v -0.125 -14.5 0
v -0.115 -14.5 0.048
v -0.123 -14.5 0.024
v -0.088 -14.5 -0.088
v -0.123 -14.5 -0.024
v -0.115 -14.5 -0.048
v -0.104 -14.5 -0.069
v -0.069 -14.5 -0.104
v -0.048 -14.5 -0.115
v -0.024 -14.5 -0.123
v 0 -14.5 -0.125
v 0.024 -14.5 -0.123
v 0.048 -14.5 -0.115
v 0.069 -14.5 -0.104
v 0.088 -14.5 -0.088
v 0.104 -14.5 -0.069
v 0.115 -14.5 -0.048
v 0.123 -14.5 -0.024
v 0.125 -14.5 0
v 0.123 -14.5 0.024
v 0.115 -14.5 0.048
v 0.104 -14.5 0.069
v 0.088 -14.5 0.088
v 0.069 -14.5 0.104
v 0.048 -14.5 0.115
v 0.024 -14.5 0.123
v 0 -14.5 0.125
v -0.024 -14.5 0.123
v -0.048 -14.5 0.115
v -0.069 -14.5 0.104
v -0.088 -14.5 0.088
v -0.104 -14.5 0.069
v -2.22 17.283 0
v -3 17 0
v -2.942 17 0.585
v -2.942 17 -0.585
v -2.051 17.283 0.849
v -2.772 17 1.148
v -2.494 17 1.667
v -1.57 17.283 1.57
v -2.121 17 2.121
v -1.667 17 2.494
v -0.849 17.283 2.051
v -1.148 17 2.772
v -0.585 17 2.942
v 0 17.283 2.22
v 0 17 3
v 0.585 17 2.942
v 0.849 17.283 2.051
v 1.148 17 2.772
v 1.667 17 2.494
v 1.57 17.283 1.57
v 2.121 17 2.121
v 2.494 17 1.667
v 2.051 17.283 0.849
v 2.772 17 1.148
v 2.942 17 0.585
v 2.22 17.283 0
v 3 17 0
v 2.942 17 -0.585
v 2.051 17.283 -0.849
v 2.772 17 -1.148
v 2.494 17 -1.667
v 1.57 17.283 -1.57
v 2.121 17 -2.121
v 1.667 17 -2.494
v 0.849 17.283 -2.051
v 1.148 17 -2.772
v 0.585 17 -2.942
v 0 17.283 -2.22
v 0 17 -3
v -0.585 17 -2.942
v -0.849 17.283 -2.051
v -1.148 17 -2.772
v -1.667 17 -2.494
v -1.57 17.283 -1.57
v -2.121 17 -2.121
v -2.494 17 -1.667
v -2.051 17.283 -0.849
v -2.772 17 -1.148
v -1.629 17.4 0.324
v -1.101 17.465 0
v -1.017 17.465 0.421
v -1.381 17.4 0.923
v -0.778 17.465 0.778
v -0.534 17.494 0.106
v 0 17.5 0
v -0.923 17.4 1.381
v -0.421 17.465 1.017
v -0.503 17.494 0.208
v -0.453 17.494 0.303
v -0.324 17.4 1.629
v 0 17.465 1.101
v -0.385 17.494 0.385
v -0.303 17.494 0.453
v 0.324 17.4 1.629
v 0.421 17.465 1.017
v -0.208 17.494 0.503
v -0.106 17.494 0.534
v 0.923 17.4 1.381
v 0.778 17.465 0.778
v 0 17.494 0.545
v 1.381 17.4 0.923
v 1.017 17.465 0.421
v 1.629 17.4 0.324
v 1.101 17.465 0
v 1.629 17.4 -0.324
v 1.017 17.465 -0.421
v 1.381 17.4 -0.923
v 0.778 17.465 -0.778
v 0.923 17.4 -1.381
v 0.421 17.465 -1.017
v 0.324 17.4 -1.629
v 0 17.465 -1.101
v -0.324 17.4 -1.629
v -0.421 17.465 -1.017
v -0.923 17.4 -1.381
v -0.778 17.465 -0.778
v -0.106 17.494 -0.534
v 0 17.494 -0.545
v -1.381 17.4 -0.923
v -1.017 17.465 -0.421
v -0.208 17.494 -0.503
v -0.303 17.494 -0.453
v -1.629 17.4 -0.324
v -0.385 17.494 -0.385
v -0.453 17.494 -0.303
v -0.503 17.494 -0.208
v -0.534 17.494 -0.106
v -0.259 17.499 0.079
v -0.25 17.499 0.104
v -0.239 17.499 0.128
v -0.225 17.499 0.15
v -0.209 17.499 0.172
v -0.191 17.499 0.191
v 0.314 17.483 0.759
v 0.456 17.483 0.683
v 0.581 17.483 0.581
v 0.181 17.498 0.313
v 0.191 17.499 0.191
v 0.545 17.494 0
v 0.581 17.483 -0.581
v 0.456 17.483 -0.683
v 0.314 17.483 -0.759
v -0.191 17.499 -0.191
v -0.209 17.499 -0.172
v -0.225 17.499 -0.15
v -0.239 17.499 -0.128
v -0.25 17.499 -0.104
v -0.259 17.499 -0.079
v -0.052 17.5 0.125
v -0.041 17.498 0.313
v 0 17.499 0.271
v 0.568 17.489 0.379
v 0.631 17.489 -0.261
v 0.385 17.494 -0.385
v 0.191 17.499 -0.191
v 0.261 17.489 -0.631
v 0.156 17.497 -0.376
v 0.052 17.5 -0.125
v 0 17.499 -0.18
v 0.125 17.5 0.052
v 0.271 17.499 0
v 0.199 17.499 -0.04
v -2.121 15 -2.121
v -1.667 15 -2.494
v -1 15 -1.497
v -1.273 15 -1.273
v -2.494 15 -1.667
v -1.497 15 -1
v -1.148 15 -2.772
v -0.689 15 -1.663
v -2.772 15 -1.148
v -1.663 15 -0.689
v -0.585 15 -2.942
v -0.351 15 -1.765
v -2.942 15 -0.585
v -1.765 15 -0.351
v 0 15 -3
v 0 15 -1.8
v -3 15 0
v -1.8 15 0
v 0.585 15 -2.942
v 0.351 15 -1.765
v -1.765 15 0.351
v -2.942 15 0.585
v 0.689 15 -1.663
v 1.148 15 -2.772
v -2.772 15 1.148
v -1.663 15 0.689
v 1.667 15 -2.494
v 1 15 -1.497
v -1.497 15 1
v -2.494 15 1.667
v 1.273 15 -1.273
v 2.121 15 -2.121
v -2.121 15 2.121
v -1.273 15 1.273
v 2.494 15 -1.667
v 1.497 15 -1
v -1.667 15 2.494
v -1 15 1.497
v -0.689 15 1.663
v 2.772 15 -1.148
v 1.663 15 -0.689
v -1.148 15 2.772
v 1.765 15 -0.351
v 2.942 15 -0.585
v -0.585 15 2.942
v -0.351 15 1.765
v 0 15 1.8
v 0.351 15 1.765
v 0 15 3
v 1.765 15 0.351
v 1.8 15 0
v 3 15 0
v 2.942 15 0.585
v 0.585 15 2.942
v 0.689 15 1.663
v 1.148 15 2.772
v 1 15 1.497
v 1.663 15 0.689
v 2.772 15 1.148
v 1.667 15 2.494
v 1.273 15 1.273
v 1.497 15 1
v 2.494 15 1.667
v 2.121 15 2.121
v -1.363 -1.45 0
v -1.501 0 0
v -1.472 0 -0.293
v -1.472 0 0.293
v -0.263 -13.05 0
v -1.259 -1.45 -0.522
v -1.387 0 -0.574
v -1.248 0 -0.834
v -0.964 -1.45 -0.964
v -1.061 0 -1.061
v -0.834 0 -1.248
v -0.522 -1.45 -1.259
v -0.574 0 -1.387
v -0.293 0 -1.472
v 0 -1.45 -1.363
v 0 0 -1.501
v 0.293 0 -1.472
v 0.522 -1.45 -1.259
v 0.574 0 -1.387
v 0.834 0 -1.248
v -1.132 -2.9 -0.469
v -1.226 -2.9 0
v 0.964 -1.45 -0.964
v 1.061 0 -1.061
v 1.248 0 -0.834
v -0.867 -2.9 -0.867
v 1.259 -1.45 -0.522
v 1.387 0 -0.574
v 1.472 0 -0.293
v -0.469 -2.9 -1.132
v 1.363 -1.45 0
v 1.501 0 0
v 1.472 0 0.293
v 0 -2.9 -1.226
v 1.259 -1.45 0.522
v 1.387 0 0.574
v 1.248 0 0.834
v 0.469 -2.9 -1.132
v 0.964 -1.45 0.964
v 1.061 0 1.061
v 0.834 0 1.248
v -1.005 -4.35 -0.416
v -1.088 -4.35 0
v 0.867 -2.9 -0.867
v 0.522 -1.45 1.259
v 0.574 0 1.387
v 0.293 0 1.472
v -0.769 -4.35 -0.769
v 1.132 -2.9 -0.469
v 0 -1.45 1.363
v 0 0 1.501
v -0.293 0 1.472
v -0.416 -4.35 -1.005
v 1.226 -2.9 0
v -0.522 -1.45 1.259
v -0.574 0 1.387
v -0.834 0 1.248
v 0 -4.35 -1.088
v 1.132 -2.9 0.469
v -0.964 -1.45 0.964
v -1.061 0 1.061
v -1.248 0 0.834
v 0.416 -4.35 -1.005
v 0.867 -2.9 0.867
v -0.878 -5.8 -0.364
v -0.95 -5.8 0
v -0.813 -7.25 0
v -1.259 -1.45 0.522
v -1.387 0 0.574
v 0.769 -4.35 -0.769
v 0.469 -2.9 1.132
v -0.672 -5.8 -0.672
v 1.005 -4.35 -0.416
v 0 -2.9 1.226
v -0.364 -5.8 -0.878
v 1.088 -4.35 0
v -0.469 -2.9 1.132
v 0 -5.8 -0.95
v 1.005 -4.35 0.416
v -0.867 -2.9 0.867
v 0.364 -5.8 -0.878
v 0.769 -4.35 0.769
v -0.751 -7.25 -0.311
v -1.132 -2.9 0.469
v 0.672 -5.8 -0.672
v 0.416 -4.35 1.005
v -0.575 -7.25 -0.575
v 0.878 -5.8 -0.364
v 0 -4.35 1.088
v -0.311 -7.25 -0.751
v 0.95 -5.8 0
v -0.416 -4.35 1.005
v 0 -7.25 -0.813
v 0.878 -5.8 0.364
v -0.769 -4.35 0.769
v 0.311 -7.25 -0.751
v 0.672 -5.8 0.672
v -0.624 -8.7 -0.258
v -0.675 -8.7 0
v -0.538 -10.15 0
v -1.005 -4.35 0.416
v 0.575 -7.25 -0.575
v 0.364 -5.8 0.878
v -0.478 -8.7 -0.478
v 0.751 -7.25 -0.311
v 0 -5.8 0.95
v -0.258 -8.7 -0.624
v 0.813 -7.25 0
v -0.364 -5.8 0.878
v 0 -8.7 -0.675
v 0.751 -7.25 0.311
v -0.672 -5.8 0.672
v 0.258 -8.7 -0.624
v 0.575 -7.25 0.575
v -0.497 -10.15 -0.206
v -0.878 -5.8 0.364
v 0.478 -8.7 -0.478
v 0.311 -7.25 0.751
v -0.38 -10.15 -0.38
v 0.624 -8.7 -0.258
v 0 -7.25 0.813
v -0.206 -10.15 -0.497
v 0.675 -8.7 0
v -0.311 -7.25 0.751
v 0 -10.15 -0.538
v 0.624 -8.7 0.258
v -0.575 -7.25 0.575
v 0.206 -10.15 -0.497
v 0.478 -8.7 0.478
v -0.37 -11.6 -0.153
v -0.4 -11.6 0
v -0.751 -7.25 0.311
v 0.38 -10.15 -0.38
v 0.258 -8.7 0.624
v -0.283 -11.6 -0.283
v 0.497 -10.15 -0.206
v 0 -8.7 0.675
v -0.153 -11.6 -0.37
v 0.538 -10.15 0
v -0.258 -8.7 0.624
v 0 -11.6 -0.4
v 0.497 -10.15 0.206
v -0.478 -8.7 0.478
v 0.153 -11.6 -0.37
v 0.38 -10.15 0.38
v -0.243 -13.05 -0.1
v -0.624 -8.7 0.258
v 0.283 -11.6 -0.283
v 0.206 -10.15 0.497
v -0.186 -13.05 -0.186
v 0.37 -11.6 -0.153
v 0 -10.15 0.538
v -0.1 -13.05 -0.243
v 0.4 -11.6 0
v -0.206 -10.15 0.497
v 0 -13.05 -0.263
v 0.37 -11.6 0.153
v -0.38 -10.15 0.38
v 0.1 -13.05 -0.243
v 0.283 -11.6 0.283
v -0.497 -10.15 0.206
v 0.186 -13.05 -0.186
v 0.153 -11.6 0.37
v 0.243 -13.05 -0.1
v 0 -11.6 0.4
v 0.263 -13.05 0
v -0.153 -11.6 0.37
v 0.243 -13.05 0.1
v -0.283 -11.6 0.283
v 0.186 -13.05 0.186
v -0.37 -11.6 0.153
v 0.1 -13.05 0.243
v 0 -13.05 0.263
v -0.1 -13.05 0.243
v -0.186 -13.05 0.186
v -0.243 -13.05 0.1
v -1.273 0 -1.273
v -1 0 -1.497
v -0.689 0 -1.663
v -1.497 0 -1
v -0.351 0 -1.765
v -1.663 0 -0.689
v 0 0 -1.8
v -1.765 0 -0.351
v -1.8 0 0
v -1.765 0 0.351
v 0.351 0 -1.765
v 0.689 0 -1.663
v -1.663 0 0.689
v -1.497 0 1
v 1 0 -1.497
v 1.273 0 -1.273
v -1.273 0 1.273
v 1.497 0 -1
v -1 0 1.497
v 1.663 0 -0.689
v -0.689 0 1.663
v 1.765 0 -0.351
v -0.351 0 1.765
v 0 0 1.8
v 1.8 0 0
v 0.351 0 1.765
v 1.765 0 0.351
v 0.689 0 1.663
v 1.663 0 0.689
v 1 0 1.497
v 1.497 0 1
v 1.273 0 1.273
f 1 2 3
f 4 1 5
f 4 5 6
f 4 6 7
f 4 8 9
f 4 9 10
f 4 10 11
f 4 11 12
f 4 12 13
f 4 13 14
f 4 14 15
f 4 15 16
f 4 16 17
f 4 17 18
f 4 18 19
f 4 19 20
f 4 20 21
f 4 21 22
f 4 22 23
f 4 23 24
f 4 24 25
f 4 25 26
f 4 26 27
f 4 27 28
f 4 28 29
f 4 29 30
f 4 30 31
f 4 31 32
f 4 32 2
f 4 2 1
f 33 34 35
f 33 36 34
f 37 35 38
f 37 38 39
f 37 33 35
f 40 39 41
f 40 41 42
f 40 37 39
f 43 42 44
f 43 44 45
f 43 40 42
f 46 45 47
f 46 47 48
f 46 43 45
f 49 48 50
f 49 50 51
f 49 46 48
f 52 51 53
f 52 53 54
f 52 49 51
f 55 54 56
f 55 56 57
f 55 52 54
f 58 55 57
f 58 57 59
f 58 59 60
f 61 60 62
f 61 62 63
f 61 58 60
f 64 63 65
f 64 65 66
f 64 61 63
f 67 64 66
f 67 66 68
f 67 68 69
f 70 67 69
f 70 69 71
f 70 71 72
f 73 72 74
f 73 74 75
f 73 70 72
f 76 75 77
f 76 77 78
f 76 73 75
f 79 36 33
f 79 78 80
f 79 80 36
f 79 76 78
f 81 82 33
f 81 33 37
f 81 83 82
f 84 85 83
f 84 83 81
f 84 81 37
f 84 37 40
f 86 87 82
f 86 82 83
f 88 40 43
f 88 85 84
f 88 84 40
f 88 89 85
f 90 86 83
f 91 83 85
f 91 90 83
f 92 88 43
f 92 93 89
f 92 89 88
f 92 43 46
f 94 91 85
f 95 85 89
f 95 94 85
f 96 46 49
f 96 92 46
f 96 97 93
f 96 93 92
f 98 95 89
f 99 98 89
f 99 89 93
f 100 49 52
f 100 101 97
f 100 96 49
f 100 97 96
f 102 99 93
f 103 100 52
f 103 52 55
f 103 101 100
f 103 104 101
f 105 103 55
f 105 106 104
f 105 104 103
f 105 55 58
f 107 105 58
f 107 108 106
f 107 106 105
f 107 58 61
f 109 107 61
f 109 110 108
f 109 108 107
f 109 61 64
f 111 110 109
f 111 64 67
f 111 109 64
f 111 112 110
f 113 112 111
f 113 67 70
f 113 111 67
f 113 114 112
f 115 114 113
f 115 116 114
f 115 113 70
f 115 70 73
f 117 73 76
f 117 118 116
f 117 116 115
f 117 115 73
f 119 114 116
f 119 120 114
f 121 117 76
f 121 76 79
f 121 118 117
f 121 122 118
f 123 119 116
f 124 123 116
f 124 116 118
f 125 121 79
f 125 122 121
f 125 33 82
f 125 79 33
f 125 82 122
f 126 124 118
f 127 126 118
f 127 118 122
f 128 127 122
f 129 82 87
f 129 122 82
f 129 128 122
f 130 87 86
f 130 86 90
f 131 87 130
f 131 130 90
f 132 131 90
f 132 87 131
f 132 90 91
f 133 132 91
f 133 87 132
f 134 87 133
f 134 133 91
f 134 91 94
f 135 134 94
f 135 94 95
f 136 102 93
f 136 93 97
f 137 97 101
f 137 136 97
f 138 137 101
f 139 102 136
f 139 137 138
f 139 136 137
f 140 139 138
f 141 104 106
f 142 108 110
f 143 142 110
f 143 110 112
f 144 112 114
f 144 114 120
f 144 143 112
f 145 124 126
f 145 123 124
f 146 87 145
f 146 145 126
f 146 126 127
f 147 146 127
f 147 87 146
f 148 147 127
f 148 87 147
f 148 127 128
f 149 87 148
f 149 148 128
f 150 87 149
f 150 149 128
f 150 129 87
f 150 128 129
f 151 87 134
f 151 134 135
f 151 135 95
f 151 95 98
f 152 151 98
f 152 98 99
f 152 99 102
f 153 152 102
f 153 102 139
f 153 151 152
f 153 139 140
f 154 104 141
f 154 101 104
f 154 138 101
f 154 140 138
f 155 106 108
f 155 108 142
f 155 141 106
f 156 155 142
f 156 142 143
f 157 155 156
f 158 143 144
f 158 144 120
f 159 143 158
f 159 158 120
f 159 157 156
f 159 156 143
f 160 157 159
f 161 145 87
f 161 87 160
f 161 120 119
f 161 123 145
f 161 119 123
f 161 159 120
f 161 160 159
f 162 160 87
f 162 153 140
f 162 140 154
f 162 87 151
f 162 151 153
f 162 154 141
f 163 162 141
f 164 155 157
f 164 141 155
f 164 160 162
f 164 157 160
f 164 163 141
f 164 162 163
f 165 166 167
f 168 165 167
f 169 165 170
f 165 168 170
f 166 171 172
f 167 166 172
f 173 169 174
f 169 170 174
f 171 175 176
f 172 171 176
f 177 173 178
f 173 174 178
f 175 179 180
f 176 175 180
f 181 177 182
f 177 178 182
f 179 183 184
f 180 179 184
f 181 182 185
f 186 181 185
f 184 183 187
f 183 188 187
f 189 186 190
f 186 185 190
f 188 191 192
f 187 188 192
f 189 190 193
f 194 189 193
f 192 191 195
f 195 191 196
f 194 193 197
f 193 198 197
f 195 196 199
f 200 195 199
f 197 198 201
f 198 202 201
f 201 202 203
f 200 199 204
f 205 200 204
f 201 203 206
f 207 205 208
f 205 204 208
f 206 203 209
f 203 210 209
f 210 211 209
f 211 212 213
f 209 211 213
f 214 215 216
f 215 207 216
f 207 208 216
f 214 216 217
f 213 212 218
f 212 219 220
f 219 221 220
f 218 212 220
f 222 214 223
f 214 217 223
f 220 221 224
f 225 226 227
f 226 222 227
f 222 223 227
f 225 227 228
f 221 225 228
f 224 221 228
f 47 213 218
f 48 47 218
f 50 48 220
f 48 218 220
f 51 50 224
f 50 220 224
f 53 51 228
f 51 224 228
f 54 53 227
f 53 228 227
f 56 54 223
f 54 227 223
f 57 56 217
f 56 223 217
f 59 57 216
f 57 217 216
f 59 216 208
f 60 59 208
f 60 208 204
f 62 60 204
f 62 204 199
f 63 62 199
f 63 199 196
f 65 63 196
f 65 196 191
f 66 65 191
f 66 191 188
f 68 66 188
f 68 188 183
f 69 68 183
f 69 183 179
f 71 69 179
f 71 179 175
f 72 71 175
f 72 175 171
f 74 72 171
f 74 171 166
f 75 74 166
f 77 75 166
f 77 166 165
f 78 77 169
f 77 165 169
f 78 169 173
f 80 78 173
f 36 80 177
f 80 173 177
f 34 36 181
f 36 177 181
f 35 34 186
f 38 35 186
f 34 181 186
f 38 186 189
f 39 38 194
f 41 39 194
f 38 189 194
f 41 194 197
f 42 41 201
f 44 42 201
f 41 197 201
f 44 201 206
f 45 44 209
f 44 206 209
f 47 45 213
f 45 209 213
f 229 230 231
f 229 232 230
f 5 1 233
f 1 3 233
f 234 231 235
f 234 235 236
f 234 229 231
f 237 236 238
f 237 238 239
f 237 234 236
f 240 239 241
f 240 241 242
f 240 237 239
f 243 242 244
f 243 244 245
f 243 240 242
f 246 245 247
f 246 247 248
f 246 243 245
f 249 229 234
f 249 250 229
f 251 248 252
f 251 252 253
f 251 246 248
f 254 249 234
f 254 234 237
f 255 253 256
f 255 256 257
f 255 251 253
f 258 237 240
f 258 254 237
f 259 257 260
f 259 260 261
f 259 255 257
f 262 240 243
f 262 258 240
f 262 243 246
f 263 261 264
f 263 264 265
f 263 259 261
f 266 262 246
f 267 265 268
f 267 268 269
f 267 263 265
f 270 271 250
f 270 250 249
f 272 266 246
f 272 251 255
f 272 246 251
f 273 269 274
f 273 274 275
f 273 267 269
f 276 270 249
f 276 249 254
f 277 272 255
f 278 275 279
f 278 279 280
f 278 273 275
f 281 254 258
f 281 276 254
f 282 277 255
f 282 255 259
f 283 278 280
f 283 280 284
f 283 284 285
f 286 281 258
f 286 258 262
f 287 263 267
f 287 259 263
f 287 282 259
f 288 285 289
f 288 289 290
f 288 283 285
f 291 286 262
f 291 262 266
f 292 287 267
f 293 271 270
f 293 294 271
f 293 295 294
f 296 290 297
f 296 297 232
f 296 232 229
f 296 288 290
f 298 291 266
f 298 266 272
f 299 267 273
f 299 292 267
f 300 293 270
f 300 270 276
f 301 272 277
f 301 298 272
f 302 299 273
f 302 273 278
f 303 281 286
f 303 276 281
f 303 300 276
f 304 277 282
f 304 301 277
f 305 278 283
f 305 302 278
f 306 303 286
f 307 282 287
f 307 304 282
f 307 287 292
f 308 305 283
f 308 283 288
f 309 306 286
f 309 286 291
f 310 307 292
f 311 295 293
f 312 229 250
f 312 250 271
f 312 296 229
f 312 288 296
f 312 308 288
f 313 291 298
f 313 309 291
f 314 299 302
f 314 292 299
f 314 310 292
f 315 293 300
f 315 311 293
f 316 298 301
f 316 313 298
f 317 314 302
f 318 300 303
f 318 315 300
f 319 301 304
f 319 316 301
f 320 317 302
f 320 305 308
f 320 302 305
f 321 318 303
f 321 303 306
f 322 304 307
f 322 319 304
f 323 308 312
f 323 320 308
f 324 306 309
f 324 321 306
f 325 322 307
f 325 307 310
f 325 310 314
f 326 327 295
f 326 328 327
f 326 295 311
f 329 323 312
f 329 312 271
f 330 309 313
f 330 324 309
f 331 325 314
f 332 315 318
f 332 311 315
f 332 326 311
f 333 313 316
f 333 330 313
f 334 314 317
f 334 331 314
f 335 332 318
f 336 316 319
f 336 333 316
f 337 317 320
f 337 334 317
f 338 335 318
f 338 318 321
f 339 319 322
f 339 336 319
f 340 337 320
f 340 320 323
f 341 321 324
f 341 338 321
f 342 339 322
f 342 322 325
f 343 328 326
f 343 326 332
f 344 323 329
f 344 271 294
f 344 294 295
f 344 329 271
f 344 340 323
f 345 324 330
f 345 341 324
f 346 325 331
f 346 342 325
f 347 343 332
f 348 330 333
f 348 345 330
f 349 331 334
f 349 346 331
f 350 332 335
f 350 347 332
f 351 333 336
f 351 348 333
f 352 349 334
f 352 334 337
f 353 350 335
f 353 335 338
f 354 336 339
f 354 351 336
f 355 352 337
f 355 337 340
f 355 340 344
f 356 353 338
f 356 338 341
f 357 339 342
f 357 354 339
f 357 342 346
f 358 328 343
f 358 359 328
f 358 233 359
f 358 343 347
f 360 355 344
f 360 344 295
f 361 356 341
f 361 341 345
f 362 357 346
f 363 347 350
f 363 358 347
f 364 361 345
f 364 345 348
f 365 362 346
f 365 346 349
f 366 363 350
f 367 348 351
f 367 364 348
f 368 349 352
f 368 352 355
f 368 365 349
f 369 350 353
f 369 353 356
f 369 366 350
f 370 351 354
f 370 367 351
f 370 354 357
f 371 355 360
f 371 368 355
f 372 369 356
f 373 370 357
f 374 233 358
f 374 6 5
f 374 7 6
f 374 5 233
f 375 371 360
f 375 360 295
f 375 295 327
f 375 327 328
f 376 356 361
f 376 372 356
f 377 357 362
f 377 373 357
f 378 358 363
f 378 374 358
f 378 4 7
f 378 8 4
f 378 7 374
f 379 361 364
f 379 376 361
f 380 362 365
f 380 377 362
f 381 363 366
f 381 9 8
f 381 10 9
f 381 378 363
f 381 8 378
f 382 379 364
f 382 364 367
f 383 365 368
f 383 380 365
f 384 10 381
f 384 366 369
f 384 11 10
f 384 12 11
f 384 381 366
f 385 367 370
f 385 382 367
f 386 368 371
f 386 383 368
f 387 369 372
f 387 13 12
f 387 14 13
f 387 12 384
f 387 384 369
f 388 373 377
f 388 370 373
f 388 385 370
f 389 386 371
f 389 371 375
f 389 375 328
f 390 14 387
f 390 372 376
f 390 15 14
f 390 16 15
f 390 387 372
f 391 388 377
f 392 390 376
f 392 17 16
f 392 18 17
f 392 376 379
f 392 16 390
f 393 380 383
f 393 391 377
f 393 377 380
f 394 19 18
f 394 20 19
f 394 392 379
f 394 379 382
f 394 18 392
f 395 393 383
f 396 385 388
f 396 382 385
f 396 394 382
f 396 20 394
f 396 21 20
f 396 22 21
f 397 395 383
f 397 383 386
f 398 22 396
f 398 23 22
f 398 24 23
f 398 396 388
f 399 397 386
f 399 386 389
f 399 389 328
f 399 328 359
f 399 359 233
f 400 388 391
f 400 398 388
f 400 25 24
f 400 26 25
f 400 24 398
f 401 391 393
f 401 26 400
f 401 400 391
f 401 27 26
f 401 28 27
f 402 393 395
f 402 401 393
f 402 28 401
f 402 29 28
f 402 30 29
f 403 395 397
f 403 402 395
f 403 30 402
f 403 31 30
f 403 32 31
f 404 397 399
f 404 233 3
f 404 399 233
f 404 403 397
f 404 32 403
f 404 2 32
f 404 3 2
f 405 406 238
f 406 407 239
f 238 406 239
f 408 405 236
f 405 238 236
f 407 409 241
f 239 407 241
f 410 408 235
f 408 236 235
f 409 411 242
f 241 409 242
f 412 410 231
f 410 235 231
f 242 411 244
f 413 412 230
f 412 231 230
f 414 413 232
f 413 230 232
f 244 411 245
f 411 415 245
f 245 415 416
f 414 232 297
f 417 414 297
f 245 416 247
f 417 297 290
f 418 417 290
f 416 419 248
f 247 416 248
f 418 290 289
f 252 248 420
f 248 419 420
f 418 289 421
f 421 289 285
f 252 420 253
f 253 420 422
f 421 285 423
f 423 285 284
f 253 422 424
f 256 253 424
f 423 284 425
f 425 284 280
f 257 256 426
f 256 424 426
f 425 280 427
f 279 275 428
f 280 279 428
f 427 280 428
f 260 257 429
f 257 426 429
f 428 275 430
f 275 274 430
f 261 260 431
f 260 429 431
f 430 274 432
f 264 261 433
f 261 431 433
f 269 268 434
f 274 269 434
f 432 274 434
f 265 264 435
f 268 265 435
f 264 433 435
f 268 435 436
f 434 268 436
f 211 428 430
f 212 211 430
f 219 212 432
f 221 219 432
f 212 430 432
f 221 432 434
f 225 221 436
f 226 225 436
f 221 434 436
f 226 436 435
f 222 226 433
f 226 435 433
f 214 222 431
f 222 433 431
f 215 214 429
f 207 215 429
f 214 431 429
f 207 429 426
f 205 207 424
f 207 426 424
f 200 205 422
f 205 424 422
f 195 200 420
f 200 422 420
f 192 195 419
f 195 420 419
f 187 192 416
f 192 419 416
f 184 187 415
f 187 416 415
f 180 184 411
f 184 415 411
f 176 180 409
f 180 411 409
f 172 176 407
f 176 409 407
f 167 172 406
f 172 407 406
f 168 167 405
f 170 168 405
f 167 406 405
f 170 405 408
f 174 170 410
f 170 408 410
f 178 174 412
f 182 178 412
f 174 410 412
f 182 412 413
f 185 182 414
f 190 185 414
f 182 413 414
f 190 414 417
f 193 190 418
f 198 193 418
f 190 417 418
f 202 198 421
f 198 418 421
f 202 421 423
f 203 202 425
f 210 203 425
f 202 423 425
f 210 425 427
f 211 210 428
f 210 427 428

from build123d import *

# Parameters (mm, degrees)
SKETCH1_R           = 1.8
BOSS_EXTRUDE1_DEPTH = 15
SKETCH2_R           = 3
BOSS_EXTRUDE2_DEPTH = 2


with BuildPart() as part:
    # Sketch1 → Boss-Extrude1 (new body)
    with BuildSketch(Plane(origin=(0, 0, 0), x_dir=(1, 0, 0), z_dir=(0, 1, 0))):
        with Locations(Location((0, 0, 0), (0, 0, 270))):
            Circle(SKETCH1_R)
    extrude(amount=BOSS_EXTRUDE1_DEPTH)

    # Sketch2 → Boss-Extrude2 (add)
    with BuildSketch(Plane(origin=(0, 15, 0), x_dir=(1, 0, 0), z_dir=(0, 1, 0))):
        with Locations(Location((0, 0, 0), (0, 0, 270))):
            Circle(SKETCH2_R)
    extrude(amount=BOSS_EXTRUDE2_DEPTH)

    # Sketch3 → Revolve1 (revolve)
    with BuildSketch(Plane.XY):
        with BuildLine():
            Line((0, 17), (-3, 17))
            add(Edge.make_bspline(
                [(-3, 17), (-2.027477475, 17.462743373), (-0.971060037, 17.5), (0, 17.5)],
                knots=[0, 0, 0, 0, 1, 1, 1, 1], degree=3))
            Line((0, 17.5), (0, 17))
        make_face()
    revolve(axis=Axis((0, 17, 0), (0, 1, 0)))

    # Sketch4 → Revolve3 (revolve)
    with BuildSketch(Plane.XY, mode=Mode.PRIVATE) as revolve3_sk:
        Polygon((0, 0), (1.500760402, 0), (0.125, -14.5), (0, -14.5), align=None)
    revolve(revolve3_sk.sketch.rotate(Axis((0, 0, 0), (0, -1, 0)), 180), axis=Axis((0, 0, 0), (0, -1, 0)))


solid = part.part
